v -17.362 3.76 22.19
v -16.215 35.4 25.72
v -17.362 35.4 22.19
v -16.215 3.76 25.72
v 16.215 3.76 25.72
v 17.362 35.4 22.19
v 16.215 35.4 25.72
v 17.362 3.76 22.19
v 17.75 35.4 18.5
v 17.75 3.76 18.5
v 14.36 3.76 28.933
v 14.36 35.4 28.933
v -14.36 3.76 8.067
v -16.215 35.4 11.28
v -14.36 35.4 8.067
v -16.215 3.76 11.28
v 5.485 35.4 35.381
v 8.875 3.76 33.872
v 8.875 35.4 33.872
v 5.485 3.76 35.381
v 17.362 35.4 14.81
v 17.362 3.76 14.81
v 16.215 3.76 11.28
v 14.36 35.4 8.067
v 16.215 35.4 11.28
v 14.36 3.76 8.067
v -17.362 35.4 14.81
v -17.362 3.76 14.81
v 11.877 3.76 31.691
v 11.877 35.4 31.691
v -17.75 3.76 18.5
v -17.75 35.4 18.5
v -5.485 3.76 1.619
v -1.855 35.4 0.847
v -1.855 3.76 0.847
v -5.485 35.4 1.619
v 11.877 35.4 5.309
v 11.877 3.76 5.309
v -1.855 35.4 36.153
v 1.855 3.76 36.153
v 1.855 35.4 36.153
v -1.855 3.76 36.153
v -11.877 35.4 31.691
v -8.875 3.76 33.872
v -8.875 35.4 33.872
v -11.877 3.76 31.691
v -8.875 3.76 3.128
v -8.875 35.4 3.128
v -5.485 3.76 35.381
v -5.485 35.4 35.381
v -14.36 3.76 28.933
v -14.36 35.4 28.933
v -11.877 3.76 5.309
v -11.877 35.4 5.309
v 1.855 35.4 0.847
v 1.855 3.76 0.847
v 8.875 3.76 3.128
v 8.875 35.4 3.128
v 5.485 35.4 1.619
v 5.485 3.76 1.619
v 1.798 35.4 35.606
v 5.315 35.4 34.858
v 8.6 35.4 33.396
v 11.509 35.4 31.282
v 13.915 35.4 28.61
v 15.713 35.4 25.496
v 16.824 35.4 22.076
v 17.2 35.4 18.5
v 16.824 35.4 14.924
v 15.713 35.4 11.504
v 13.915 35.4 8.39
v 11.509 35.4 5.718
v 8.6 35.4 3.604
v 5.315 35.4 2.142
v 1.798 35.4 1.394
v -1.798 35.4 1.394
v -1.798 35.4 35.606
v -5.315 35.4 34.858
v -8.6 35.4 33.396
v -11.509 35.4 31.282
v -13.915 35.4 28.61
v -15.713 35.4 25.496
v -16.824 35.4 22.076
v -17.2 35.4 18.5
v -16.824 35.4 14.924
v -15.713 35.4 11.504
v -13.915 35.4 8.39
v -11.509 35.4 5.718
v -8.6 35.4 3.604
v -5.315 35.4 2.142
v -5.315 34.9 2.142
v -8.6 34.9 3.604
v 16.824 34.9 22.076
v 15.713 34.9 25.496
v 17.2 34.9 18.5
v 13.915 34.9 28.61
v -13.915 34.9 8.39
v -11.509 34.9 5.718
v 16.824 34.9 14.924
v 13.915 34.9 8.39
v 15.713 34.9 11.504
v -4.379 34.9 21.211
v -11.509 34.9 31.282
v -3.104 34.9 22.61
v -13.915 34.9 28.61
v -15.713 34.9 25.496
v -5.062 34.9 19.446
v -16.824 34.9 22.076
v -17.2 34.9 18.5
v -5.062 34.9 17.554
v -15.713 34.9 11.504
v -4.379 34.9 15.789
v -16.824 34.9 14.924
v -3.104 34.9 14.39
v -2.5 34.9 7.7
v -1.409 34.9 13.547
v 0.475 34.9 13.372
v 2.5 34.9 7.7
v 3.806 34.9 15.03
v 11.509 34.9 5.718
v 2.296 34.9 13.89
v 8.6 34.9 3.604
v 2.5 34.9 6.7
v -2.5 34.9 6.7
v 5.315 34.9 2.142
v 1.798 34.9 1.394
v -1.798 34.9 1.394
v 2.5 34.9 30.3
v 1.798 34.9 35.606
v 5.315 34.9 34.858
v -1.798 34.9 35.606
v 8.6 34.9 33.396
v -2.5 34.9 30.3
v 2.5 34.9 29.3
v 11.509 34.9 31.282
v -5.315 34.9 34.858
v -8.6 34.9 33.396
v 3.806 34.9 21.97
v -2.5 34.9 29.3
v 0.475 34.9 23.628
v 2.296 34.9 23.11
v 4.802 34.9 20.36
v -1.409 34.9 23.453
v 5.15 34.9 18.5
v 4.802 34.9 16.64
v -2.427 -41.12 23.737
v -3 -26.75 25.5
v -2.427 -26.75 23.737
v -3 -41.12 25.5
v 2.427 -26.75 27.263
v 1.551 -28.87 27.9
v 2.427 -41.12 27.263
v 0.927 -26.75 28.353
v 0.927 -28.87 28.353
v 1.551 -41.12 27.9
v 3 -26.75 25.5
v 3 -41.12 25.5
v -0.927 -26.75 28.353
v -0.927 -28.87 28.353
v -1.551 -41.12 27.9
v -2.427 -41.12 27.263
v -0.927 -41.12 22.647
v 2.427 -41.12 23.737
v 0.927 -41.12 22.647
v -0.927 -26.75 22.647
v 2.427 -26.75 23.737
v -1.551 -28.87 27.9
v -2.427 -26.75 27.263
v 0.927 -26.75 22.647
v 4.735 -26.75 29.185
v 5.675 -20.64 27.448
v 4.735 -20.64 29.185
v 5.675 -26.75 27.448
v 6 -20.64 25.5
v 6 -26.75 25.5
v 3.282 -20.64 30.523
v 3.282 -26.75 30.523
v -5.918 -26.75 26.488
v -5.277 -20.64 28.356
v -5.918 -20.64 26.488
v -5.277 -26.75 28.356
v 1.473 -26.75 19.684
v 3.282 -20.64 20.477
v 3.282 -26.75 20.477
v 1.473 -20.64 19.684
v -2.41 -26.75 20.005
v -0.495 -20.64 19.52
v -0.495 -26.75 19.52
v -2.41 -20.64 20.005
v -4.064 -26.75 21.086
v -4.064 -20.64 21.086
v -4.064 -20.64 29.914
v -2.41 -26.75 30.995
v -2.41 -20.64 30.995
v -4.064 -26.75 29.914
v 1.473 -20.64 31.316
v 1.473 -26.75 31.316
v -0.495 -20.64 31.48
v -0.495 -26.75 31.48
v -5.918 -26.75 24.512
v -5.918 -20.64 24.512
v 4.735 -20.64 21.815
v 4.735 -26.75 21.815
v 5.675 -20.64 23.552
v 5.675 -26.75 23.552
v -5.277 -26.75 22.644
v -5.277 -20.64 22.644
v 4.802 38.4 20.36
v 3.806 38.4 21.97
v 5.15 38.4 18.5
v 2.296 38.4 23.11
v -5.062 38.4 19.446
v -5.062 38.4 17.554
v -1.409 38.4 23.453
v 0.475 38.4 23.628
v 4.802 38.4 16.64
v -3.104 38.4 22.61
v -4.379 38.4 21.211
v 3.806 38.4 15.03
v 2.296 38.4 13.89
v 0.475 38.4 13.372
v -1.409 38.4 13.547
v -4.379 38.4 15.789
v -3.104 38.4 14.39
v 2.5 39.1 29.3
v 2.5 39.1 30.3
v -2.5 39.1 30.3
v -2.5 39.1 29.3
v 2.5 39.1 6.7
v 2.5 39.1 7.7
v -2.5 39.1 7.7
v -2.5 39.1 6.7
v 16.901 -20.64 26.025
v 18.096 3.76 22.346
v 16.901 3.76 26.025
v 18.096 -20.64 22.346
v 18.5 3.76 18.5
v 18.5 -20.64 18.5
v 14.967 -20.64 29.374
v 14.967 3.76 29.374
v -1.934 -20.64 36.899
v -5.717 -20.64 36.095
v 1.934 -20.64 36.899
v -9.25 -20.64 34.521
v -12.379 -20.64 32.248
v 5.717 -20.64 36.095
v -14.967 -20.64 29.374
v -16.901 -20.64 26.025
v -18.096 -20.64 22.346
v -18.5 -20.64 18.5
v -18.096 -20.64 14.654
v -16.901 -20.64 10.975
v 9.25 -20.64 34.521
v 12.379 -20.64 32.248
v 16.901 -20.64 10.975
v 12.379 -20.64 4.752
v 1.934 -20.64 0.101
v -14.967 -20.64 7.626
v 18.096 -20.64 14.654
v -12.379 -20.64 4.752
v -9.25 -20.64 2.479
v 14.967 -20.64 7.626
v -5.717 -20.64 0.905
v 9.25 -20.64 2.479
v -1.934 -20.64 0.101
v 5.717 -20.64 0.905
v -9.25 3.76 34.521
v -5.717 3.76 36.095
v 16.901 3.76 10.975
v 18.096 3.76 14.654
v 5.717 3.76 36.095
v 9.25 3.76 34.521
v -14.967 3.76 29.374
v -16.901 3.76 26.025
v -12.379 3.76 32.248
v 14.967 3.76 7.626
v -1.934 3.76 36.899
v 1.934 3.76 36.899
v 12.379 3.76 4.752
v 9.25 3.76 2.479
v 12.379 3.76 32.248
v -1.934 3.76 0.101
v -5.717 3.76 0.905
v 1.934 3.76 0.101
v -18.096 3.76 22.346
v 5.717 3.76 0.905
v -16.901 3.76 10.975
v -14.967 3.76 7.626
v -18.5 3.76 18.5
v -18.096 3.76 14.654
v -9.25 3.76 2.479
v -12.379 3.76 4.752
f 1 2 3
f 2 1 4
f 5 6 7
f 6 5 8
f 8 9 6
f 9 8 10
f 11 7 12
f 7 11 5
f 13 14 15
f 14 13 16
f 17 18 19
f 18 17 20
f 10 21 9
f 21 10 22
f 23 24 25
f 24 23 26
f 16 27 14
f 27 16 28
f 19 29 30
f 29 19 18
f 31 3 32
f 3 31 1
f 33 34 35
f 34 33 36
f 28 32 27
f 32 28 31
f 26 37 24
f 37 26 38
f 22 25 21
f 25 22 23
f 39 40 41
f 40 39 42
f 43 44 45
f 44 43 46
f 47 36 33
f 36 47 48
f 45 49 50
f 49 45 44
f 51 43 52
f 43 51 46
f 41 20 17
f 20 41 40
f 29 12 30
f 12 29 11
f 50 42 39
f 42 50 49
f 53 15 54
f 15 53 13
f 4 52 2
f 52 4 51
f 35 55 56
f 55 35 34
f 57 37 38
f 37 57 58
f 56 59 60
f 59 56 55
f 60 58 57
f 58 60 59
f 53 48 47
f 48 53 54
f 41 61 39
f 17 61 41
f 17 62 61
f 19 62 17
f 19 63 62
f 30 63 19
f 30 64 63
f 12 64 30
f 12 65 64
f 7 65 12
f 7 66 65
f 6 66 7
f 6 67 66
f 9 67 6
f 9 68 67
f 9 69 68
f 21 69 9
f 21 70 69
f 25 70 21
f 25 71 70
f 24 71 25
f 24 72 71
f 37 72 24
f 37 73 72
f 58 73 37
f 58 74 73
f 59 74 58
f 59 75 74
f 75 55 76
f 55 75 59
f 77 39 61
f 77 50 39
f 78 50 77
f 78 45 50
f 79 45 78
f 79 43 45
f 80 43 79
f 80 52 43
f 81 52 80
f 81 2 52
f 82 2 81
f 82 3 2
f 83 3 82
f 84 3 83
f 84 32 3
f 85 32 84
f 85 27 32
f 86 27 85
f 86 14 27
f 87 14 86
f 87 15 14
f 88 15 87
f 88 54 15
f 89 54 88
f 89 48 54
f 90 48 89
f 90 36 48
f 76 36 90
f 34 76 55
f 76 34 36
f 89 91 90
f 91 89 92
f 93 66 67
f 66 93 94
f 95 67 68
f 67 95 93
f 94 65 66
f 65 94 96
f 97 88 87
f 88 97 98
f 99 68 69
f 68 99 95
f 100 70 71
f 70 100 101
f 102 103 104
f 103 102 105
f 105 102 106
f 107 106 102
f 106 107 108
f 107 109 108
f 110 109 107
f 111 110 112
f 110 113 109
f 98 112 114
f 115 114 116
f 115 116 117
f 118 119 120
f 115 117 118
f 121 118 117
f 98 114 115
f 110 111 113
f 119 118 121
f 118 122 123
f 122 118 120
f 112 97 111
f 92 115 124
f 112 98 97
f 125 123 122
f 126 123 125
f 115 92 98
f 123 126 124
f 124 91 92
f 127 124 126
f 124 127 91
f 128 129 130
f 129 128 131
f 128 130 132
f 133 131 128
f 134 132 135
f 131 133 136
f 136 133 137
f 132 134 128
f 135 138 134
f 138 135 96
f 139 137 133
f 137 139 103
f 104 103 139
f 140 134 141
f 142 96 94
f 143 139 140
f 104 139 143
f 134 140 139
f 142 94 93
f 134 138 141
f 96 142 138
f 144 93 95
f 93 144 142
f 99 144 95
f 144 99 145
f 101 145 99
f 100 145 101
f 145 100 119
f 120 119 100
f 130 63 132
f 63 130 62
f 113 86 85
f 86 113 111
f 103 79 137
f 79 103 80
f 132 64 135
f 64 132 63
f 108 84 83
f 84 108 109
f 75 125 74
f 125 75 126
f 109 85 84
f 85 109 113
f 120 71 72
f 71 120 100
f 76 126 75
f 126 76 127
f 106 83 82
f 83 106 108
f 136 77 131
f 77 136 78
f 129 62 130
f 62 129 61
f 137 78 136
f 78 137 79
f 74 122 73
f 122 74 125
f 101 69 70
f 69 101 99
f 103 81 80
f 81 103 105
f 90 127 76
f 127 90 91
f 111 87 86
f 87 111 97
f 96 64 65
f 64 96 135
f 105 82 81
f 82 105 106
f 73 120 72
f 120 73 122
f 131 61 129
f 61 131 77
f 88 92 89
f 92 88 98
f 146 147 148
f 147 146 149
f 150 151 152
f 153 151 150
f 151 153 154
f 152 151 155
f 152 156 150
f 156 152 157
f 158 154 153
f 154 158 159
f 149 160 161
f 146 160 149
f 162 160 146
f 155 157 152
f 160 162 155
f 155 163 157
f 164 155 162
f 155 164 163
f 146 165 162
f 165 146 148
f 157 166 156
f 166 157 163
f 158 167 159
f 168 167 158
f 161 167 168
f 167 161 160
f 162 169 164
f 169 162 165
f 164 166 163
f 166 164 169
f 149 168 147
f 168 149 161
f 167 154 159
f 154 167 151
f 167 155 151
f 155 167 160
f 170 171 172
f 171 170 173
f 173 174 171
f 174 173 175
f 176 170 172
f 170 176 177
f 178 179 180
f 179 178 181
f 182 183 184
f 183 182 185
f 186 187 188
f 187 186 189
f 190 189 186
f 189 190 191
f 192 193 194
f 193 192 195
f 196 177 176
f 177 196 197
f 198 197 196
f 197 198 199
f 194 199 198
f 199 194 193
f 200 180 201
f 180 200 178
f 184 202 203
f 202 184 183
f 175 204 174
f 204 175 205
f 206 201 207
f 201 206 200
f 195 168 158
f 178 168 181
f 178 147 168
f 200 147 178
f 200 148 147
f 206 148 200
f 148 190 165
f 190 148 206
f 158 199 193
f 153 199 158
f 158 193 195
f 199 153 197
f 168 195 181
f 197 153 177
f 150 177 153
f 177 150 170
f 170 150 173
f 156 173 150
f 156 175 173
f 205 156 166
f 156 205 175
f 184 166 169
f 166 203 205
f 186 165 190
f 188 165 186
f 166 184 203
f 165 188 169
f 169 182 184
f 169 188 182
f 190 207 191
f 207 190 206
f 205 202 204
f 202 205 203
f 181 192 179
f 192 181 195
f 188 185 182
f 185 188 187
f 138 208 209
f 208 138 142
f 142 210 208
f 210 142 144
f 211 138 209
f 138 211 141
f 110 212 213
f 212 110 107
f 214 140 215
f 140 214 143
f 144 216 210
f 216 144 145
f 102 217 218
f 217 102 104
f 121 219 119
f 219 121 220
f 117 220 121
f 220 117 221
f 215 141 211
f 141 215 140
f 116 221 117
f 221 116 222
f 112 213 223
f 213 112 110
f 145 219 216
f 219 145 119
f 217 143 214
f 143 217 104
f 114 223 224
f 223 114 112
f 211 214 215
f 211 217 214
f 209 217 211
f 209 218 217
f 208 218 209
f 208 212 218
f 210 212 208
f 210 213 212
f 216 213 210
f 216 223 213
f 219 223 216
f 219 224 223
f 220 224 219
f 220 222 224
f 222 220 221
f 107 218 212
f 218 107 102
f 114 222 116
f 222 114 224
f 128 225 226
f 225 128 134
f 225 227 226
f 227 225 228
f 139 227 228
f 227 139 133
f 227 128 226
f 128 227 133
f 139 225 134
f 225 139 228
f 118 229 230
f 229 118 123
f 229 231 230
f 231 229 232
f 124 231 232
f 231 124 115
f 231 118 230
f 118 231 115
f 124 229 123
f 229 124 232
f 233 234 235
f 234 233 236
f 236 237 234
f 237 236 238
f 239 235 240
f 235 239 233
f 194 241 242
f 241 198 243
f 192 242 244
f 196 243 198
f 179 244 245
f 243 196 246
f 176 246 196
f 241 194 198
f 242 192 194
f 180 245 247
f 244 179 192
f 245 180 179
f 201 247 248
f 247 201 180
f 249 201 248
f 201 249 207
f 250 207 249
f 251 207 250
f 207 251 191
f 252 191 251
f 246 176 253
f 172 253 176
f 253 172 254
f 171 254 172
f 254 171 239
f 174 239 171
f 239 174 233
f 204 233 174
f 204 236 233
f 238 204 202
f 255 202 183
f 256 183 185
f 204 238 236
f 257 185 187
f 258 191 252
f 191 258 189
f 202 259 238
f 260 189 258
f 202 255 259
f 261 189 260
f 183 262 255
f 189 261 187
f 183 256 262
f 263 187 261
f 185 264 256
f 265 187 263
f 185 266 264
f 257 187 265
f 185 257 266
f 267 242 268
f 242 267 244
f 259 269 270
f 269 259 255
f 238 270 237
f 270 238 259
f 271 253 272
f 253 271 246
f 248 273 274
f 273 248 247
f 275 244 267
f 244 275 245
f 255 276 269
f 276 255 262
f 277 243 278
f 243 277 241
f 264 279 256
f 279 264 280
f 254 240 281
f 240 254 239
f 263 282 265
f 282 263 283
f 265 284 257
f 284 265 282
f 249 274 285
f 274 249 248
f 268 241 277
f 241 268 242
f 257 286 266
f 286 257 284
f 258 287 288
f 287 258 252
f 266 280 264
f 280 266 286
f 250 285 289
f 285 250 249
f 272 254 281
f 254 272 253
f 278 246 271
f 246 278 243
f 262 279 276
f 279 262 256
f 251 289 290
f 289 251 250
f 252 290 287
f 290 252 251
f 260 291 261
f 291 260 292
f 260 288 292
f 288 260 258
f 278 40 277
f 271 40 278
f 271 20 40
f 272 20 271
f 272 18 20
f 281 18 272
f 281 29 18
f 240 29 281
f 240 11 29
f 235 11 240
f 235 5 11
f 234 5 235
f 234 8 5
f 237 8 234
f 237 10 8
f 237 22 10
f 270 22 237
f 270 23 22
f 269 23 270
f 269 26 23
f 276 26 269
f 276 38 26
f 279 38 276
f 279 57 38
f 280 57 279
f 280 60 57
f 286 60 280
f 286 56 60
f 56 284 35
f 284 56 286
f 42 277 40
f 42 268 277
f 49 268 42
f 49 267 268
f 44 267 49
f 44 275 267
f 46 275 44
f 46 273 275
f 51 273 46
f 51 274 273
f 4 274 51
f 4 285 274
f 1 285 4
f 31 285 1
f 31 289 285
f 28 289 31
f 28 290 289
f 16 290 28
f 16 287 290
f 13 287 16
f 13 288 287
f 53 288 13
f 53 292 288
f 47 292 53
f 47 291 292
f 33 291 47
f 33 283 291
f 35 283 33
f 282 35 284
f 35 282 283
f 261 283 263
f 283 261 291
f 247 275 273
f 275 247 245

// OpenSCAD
module engine() {
    translate([0,0,18.5])
    rotate([90,0,0]) {
        translate([0,0,-15.5]) difference() {
            translate([0,0,8.1]) cylinder(56, 35.5/2, 35.5/2, center=true);    
            translate([0,0,-20.4]) cylinder(2, 34.4/2, 34.4/2, center=true);     
        }        
        
        translate([0,0,-35.9]) cylinder(5, 5.15, 5.15, center=true);
        translate([0,22.6/2,-35.6]) cube([5, 1, 7], center=true);
        translate([0,-22.6/2,-35.6]) cube([5, 1, 7], center=true);
        
        translate([0,0,8.44]) cylinder(24.4, 37/2, 37/2, center=true);    
        
        translate([0,7,23.65]) {
            cylinder(6.2, 6, 6, center=true);
            translate([0,0,10.27]) difference() {
                cylinder(14.4, 3, 3, center=true);
                translate([0,1+3-0.6,1.1]) cube([5,2,12.3], center=true);
            }
        }
    }
}

engine();
